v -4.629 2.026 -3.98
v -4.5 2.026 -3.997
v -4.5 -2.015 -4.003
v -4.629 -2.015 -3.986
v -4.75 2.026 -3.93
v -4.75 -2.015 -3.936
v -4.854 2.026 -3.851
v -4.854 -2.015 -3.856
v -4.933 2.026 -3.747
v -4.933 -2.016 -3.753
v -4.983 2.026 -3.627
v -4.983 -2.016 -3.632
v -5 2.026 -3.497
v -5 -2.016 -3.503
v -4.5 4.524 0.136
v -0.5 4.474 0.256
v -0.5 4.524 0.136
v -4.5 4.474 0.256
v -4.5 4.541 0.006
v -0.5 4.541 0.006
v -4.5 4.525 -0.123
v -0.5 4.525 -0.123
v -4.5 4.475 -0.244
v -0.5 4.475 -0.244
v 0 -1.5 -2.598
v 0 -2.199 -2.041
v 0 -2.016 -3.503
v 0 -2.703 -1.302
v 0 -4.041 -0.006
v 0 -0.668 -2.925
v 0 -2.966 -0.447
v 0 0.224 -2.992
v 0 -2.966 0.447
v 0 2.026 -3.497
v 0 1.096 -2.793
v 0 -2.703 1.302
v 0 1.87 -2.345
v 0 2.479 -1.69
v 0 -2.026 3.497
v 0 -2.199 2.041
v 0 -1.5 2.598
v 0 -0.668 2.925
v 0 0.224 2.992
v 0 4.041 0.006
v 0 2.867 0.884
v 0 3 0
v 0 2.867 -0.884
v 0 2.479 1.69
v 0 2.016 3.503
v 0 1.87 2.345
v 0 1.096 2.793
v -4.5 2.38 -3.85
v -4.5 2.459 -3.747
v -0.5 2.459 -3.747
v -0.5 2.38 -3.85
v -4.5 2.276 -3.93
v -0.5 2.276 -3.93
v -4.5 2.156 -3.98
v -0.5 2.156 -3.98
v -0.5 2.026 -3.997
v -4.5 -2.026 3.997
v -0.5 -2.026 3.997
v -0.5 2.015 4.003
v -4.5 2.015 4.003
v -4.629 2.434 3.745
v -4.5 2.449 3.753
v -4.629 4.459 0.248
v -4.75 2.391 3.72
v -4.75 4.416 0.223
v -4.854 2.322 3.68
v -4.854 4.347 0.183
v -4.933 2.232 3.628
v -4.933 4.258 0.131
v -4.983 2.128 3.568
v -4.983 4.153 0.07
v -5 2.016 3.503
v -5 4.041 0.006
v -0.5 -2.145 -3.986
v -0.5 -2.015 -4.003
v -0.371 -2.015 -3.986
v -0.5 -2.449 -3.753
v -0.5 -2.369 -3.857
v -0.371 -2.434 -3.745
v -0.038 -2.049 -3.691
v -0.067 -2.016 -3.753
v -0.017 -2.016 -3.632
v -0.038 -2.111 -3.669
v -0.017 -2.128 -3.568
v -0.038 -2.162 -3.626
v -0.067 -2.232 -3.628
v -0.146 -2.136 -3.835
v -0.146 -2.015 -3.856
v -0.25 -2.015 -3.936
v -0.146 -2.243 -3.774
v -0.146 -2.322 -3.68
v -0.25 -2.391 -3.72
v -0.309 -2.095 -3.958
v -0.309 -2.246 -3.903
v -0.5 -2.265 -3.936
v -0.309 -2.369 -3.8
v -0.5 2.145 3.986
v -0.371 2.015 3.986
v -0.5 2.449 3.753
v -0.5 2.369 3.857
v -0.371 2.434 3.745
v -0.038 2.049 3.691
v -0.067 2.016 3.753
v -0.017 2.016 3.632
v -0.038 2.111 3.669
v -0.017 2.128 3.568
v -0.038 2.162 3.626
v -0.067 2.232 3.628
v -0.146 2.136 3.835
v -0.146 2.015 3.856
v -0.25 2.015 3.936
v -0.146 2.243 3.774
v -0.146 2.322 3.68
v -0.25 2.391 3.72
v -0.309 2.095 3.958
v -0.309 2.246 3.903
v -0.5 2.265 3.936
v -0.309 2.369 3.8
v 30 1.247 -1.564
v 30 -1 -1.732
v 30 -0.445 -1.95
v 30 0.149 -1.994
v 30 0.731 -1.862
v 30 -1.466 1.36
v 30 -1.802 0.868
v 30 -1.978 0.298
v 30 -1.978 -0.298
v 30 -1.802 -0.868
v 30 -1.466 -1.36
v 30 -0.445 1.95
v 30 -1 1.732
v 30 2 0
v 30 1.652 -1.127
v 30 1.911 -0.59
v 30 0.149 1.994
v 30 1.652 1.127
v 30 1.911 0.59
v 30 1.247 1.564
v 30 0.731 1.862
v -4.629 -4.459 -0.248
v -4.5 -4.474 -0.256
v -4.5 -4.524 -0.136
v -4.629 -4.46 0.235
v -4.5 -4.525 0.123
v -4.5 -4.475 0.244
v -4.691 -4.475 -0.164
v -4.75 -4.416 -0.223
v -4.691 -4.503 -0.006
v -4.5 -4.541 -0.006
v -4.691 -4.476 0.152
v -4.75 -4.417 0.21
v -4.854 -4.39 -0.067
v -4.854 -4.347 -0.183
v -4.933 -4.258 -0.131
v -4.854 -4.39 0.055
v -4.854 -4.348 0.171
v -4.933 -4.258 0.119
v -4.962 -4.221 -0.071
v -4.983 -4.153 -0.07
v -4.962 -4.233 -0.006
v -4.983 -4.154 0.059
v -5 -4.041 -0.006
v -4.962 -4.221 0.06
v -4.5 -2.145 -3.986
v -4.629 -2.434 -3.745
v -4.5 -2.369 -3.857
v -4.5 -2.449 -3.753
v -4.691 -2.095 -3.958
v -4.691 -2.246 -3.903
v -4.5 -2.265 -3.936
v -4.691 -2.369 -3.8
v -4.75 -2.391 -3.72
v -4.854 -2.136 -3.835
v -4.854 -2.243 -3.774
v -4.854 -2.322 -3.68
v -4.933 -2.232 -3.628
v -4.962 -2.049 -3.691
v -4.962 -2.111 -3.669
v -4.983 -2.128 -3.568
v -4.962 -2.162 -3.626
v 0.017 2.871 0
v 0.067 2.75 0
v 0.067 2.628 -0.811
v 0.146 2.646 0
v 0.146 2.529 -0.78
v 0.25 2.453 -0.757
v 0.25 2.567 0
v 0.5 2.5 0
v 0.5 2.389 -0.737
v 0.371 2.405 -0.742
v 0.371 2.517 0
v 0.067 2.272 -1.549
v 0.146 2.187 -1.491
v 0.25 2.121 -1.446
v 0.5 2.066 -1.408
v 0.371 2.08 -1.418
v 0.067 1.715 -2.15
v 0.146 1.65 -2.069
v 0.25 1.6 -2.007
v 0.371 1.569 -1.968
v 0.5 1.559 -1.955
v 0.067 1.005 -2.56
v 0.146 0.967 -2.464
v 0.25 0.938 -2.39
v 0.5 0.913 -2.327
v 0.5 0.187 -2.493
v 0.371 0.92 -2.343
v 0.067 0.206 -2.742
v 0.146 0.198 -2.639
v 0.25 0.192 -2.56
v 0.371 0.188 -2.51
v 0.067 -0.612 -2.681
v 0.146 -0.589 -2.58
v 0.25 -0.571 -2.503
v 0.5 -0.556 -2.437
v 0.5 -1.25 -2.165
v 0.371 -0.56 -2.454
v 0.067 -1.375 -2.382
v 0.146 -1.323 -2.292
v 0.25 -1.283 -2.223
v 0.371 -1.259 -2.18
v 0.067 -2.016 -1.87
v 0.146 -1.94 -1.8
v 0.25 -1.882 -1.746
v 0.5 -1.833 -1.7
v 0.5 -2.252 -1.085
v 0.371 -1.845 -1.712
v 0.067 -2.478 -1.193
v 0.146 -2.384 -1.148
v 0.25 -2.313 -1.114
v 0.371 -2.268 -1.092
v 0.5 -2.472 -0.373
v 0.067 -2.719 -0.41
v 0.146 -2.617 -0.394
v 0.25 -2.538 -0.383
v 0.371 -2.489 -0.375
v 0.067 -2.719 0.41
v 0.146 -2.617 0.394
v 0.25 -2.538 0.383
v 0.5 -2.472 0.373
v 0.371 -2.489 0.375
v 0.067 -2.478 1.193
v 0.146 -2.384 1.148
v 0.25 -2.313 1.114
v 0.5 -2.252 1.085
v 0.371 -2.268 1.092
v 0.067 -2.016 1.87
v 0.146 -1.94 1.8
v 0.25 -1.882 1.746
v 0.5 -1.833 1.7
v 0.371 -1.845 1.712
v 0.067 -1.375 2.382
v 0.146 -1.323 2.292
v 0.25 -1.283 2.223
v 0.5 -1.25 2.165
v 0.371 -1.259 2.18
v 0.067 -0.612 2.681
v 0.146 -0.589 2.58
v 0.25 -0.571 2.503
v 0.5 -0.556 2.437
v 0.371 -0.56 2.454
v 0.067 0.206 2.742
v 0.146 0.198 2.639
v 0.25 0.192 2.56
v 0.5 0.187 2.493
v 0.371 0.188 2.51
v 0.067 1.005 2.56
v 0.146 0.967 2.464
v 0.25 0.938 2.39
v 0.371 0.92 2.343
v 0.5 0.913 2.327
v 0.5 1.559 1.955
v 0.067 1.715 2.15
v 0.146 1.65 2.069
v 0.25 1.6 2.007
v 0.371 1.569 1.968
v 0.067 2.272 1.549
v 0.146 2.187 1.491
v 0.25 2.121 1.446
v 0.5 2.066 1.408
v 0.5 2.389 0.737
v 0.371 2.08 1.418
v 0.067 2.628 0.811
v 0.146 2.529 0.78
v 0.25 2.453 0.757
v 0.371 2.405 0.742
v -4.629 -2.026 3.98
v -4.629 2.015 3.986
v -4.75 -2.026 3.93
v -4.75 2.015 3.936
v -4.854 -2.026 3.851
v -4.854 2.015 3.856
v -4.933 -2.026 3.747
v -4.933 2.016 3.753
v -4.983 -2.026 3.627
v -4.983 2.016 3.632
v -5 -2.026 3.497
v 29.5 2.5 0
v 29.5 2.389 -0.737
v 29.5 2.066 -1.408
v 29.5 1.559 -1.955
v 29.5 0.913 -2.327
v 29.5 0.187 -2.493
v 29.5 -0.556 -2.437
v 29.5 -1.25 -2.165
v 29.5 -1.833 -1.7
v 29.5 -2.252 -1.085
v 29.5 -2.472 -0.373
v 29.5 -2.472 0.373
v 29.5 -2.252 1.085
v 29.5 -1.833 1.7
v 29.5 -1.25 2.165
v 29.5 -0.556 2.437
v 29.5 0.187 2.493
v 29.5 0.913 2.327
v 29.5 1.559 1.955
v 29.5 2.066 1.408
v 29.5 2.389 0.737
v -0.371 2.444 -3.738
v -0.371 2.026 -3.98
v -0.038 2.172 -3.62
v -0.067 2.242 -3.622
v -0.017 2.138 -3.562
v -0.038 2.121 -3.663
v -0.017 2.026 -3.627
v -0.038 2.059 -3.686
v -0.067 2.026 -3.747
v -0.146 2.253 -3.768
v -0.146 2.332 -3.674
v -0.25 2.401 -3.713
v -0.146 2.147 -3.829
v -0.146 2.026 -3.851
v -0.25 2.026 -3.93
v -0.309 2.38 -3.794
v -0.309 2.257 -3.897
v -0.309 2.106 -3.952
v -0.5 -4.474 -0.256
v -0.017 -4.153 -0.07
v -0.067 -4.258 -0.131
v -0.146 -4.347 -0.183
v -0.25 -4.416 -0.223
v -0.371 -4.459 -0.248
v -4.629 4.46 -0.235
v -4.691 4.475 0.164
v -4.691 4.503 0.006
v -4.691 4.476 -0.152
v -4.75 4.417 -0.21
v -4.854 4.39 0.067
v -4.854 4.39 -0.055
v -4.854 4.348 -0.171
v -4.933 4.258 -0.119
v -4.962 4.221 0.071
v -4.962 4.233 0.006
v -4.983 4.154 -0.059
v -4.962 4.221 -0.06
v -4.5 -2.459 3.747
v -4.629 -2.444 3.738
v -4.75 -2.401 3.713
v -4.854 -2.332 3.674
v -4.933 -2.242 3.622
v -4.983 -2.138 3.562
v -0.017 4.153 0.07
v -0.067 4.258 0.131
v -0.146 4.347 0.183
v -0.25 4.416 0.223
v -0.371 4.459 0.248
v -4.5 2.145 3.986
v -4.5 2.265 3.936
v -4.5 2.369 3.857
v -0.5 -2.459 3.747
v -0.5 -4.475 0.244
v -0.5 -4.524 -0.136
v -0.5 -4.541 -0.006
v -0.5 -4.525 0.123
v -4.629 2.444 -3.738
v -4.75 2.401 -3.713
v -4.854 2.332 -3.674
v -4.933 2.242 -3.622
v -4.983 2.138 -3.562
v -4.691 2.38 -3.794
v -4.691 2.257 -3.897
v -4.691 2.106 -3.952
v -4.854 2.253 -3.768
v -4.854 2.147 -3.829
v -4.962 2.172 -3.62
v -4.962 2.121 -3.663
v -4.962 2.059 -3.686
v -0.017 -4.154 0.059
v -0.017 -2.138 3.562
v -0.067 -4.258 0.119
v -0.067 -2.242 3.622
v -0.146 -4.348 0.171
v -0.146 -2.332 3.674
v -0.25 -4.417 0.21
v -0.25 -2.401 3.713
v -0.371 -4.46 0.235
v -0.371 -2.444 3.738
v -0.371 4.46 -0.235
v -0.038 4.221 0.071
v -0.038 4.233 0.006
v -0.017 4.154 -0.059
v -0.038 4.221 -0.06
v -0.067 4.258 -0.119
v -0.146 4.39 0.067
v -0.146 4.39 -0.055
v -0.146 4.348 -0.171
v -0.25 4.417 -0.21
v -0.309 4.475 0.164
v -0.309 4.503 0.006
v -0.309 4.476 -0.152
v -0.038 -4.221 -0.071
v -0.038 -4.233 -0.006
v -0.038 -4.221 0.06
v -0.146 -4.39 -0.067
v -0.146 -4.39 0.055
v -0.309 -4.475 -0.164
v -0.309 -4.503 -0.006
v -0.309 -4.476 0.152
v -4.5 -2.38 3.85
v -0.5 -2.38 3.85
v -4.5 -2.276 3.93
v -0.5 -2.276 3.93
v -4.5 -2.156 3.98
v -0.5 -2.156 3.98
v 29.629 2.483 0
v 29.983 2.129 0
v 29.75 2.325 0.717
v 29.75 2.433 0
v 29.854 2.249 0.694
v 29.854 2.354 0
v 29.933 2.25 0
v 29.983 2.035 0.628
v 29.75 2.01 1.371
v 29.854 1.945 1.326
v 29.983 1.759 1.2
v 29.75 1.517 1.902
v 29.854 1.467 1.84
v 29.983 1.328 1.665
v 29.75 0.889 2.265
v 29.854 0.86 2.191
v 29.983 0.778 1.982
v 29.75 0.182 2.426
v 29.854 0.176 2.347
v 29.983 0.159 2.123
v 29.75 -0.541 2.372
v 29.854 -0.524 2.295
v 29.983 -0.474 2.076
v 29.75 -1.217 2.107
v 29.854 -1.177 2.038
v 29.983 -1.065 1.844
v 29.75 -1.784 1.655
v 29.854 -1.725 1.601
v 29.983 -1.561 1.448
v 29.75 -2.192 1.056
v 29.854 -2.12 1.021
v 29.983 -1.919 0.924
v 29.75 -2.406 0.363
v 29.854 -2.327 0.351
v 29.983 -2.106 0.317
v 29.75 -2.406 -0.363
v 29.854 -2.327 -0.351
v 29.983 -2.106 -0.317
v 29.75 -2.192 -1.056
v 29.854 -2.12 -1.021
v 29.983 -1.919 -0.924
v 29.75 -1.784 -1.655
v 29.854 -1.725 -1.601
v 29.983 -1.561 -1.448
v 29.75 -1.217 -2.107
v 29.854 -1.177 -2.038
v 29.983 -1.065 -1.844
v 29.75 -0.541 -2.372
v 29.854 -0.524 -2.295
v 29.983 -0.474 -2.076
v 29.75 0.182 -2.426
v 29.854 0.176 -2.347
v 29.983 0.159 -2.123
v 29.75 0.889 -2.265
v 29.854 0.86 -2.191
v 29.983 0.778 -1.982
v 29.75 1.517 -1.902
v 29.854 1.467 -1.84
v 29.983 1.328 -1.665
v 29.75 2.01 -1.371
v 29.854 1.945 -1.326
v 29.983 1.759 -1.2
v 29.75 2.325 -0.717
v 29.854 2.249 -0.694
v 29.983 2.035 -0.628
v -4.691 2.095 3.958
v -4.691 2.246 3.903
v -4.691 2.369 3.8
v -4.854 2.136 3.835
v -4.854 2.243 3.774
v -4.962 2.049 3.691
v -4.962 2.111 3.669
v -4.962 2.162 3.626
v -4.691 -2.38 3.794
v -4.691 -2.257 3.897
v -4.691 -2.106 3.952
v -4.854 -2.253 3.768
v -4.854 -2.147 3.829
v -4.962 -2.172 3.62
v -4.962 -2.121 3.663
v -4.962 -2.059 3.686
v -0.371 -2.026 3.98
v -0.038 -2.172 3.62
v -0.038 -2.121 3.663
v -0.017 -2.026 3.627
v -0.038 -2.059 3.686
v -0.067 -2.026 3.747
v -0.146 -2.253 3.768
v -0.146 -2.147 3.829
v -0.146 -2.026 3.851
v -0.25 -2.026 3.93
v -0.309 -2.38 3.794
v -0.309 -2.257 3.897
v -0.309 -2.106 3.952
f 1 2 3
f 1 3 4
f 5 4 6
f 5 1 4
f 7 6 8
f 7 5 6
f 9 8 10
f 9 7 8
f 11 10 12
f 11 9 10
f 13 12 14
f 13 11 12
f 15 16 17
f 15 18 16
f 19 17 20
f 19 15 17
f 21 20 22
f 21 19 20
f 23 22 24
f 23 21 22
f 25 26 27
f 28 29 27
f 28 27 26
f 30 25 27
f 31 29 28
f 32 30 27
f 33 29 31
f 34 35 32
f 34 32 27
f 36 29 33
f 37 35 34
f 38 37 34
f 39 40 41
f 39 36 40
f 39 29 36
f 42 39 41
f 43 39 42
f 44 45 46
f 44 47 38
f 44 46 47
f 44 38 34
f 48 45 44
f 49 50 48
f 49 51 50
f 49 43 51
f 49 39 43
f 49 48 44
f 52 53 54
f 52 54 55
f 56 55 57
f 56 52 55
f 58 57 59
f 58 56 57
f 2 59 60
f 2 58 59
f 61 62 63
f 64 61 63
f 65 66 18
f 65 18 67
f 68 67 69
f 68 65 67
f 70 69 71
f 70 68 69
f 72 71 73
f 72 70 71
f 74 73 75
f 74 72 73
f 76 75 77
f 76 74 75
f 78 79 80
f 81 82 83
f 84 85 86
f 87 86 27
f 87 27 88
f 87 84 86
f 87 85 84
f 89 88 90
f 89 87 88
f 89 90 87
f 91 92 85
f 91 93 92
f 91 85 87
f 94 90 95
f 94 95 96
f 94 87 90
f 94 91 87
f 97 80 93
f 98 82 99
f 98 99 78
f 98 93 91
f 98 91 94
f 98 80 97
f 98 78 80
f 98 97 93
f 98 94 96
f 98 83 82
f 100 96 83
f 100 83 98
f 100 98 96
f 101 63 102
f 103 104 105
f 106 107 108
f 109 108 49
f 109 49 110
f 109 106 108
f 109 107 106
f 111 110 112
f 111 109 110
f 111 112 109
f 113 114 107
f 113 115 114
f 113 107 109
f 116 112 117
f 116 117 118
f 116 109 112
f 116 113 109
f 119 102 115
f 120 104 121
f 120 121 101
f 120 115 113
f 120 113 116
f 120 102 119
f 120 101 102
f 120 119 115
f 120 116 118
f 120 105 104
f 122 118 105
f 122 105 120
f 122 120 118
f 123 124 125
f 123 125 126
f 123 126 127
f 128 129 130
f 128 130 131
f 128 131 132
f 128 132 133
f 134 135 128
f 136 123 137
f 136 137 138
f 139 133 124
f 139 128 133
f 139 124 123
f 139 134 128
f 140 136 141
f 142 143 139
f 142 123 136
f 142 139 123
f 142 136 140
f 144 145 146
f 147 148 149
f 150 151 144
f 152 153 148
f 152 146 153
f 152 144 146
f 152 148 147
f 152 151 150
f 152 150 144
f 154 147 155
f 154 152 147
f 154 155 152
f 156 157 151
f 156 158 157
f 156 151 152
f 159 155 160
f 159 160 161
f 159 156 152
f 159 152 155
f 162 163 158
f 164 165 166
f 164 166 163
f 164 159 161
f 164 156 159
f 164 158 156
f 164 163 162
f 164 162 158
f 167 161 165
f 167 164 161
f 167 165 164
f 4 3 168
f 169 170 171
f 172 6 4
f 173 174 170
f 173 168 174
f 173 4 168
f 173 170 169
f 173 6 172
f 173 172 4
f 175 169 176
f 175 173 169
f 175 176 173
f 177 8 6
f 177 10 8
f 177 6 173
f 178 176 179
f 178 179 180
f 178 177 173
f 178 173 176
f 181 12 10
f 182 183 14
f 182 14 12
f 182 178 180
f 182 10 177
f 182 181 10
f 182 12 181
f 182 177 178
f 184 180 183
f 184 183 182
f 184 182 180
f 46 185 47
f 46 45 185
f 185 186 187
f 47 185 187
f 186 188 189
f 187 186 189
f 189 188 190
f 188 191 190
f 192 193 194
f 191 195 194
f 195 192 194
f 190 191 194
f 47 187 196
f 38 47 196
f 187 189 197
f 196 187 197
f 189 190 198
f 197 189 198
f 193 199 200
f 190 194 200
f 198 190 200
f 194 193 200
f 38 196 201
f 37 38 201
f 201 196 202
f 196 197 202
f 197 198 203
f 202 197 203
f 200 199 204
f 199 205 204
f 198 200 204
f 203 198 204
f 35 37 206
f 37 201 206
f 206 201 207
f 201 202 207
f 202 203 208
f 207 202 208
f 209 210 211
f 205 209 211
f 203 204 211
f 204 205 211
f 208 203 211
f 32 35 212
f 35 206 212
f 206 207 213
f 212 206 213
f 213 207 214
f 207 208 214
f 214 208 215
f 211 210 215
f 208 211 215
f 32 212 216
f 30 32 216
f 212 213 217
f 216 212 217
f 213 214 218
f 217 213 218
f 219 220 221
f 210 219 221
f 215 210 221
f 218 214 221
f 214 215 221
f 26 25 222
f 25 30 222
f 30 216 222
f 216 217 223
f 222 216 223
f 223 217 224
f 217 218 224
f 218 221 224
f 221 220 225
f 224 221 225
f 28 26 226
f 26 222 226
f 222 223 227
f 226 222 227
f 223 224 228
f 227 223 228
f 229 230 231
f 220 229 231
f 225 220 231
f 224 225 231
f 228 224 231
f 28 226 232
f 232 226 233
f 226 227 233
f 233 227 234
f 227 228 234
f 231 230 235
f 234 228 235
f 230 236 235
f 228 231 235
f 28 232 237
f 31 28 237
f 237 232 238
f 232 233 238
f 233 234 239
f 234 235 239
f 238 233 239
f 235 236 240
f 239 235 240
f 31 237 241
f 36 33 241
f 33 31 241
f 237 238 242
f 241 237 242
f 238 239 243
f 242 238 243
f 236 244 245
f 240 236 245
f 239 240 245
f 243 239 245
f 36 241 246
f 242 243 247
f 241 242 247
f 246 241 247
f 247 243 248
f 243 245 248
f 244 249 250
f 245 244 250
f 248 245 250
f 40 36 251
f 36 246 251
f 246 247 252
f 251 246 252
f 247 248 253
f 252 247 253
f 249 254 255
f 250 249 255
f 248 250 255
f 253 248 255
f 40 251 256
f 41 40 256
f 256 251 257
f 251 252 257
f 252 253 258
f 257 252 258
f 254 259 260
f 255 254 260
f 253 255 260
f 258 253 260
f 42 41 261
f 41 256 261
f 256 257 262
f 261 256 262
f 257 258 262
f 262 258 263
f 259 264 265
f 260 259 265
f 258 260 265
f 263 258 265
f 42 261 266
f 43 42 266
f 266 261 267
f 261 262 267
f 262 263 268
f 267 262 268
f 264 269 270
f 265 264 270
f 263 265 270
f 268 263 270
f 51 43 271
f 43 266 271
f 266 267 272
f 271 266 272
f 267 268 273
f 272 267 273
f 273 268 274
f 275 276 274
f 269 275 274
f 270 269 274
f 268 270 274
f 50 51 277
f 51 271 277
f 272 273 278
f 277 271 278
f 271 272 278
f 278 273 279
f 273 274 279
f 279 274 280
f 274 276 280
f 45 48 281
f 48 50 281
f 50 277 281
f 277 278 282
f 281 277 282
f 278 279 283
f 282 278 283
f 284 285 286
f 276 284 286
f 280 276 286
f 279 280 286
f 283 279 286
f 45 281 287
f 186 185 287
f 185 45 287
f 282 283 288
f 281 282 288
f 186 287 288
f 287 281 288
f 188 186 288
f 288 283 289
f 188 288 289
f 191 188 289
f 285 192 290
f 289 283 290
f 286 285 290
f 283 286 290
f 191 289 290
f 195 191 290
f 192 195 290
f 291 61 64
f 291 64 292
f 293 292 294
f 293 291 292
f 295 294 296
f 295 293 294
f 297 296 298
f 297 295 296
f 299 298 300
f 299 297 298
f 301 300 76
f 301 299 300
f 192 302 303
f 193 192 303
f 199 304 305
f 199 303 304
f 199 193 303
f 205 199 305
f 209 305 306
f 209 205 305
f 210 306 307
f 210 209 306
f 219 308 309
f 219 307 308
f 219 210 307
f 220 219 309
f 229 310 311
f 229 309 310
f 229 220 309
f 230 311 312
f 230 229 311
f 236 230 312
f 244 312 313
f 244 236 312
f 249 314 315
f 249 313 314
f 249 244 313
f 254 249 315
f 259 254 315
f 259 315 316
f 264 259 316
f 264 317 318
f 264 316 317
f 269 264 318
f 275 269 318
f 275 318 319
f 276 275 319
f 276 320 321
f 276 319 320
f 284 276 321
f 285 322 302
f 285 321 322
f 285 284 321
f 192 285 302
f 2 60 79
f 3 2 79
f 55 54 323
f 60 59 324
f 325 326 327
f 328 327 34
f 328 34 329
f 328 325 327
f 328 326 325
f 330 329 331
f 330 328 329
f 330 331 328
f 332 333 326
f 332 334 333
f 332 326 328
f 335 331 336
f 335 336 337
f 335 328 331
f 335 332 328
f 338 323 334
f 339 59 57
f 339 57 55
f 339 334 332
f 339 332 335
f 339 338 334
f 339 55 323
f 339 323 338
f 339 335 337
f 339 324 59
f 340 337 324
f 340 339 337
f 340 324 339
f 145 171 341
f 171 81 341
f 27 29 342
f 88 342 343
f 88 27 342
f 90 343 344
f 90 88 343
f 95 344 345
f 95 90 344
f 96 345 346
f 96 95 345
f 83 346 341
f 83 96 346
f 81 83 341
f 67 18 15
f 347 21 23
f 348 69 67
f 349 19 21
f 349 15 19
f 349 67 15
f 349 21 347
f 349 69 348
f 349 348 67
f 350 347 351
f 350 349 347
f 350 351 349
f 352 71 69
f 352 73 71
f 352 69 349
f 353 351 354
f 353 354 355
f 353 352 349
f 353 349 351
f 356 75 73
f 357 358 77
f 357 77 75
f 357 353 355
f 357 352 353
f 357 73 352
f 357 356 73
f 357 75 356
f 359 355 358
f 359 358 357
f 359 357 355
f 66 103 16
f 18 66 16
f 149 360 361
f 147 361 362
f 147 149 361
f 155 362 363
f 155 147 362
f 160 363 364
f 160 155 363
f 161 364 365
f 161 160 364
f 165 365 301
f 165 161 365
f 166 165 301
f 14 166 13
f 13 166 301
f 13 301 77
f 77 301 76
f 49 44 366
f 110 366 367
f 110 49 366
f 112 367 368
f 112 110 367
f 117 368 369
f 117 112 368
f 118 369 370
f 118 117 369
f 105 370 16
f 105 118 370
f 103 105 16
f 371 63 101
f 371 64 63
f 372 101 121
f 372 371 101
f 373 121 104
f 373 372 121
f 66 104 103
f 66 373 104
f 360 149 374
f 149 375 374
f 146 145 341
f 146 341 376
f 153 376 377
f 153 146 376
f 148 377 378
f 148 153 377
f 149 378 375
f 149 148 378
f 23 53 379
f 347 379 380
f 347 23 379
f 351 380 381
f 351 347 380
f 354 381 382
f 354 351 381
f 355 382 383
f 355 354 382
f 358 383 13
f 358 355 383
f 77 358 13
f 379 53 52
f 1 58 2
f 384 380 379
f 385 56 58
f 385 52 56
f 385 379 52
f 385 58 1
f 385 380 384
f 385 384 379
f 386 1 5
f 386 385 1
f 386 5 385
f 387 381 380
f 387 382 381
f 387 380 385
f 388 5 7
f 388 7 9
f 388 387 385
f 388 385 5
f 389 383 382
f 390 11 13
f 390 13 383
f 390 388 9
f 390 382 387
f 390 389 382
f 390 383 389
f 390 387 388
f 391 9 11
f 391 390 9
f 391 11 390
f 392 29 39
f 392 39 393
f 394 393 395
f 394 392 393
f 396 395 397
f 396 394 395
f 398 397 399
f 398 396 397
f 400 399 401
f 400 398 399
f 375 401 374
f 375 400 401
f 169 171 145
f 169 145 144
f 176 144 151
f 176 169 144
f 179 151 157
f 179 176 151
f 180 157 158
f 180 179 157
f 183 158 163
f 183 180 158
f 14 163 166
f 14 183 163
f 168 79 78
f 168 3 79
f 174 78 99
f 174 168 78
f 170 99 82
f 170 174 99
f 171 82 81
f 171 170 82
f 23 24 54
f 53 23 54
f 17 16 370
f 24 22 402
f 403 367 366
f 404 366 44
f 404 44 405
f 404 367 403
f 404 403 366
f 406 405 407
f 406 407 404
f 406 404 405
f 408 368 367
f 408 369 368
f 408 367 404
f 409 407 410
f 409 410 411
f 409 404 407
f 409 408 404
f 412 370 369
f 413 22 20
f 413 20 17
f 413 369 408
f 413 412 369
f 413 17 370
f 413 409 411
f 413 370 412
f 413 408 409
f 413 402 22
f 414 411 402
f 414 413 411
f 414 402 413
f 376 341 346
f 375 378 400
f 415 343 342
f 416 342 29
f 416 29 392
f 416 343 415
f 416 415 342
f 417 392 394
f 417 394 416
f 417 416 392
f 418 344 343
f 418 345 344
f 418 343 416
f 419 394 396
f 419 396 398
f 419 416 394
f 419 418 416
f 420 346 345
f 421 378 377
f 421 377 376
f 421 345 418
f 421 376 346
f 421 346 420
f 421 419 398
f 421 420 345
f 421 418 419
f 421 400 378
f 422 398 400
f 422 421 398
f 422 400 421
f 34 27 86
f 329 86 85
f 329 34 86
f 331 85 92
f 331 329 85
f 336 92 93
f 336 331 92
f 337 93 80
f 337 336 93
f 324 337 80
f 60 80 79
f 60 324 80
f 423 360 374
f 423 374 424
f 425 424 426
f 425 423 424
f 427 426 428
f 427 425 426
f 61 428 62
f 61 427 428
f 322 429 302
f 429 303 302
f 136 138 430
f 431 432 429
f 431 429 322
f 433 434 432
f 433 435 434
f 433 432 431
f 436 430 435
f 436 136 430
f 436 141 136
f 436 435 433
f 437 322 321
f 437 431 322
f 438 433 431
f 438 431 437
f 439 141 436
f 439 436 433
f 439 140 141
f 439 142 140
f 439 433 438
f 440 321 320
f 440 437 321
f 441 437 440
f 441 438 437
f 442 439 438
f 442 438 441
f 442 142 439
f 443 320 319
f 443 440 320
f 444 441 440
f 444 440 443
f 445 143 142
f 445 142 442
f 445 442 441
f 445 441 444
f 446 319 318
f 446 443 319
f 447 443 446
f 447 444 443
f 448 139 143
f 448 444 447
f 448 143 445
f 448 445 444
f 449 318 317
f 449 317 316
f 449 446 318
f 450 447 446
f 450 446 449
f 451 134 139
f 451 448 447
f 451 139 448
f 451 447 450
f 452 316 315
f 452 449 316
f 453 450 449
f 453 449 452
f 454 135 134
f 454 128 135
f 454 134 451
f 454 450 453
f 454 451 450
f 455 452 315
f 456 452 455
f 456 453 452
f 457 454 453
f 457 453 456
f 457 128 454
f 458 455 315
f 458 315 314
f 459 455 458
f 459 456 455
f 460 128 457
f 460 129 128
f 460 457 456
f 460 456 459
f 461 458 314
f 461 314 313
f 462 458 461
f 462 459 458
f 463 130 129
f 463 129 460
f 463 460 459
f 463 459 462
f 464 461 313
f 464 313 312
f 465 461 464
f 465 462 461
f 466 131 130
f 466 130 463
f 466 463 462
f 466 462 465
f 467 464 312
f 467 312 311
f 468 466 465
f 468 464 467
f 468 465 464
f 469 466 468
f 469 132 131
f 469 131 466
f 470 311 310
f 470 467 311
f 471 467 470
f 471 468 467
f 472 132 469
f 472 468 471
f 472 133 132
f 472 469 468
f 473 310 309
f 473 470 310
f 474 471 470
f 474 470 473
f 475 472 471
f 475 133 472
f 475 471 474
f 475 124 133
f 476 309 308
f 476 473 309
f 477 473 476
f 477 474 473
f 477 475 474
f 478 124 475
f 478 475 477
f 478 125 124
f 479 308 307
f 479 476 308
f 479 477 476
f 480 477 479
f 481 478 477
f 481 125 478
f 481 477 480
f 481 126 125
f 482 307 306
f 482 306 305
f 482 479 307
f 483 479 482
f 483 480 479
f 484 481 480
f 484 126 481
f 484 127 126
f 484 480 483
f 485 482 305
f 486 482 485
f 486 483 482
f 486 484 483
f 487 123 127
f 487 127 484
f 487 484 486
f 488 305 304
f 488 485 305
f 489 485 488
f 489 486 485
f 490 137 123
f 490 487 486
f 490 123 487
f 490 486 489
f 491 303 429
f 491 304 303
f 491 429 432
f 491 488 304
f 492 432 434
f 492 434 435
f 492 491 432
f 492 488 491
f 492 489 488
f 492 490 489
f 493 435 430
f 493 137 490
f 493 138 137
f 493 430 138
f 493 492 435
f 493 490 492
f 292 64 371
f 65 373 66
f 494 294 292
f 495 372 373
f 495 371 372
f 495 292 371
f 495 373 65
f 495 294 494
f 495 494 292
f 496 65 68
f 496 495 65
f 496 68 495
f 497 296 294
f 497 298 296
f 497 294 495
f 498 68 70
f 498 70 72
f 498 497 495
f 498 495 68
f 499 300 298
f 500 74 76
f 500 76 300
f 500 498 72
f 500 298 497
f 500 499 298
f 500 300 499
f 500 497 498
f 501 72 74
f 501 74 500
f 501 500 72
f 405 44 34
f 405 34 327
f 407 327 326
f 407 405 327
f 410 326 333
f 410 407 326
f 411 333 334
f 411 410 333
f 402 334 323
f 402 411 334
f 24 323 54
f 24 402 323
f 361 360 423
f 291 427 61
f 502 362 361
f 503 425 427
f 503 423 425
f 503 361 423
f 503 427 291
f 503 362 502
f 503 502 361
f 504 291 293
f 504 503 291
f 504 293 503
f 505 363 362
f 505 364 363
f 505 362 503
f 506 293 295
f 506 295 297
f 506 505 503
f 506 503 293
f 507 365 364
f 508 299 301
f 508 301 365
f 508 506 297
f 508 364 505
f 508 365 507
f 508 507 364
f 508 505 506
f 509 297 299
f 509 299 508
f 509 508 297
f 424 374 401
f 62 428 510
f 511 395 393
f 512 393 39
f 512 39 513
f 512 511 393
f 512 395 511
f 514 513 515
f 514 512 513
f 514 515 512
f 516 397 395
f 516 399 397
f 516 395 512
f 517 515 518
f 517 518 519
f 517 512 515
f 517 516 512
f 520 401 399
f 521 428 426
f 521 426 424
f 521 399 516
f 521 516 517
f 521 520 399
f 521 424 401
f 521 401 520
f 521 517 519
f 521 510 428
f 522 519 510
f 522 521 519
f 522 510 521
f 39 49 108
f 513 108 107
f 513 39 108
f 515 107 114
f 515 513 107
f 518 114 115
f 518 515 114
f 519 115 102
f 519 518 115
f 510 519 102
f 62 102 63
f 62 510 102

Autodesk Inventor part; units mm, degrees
ref_plane "YZ Plane" through (0, 0, 0) normal (1, 0, 0) x (0, 1, 0)
ref_plane "XZ Plane" through (0, 0, 0) normal (0, 1, 0) x (-1, 0, 0)
ref_plane "XY Plane" through (0, 0, 0) normal (0, 0, 1) x (1, 0, 0)
sketch "Sketch1" plane through (0, 0, 0) normal (1, 0, 0) x (0, 1, 0)
  circle A0 centre (0, 0) radius 2.5
  line L0 (2.3039, 4.0032) -> (4.6188, 0.0063)
  line L1 (4.6188, 0.0063) -> (2.3149, -3.9968)
  line L2 (2.3149, -3.9968) -> (-2.3039, -4.0032)
  line L3 (-2.3039, -4.0032) -> (-4.6188, -0.0063)
  line L4 (-4.6188, -0.0063) -> (-2.3149, 3.9968)
  line L5 (-2.3149, 3.9968) -> (2.3039, 4.0032)
  dimension "d0" = 5
  dimension "d1" = 8
extrude "Extrusion1" add sketch "Sketch1" along normal blind 30 contours A0
extrude "Extrusion2" add sketch "Sketch1" against normal blind 5 contours A0 | L0 L1 L2 L3 L4 L5
thread "Thread1" size "M5x0.8" class "6g" standard "ANSI Metric M Profile" full length
fillet "Fillet1" radius 0.5 6 edges at (-2.5, 2.3039, 4.0032) (-2.5, 4.6188, 0.0063) (-2.5, -2.3149, 3.9968) (-2.5, -4.6188, -0.0063) (-2.5, -2.3039, -4.0032) (-2.5, 2.3149, -3.9968)
fillet "Fillet2" radius 0.5 24 edges at (-5, -4.5414, -0.0062) (-5, -3.4668, 1.9953) (-5, -2.2761, 3.9299) (-5, -0.0055, 4) (-5, 2.2653, 3.9361) (-5, 3.4614, 2.0047) (-5, 4.5414, 0.0062) (-5, 3.4668, -1.9953) (-5, 2.2761, -3.9299) (-5, 0.0055, -4) (-5, -2.2653, -3.9361) (-5, -3.4614, -2.0047) (0, -4.5414, -0.0062) (0, -3.4668, 1.9953) (0, -2.2761, 3.9299) (0, -0.0055, 4) (0, 2.2653, 3.9361) (0, 3.4614, 2.0047) (0, 4.5414, 0.0062) (0, 3.4668, -1.9953) (0, 2.2761, -3.9299) (0, 0.0055, -4) (0, -2.2653, -3.9361) (0, -3.4614, -2.0047)
fillet "Fillet3" radius 0.5 2 edges at (0, -2.5, 0) (30, -2.5, 0)
properties part number "SzenzorCsavar5os"
